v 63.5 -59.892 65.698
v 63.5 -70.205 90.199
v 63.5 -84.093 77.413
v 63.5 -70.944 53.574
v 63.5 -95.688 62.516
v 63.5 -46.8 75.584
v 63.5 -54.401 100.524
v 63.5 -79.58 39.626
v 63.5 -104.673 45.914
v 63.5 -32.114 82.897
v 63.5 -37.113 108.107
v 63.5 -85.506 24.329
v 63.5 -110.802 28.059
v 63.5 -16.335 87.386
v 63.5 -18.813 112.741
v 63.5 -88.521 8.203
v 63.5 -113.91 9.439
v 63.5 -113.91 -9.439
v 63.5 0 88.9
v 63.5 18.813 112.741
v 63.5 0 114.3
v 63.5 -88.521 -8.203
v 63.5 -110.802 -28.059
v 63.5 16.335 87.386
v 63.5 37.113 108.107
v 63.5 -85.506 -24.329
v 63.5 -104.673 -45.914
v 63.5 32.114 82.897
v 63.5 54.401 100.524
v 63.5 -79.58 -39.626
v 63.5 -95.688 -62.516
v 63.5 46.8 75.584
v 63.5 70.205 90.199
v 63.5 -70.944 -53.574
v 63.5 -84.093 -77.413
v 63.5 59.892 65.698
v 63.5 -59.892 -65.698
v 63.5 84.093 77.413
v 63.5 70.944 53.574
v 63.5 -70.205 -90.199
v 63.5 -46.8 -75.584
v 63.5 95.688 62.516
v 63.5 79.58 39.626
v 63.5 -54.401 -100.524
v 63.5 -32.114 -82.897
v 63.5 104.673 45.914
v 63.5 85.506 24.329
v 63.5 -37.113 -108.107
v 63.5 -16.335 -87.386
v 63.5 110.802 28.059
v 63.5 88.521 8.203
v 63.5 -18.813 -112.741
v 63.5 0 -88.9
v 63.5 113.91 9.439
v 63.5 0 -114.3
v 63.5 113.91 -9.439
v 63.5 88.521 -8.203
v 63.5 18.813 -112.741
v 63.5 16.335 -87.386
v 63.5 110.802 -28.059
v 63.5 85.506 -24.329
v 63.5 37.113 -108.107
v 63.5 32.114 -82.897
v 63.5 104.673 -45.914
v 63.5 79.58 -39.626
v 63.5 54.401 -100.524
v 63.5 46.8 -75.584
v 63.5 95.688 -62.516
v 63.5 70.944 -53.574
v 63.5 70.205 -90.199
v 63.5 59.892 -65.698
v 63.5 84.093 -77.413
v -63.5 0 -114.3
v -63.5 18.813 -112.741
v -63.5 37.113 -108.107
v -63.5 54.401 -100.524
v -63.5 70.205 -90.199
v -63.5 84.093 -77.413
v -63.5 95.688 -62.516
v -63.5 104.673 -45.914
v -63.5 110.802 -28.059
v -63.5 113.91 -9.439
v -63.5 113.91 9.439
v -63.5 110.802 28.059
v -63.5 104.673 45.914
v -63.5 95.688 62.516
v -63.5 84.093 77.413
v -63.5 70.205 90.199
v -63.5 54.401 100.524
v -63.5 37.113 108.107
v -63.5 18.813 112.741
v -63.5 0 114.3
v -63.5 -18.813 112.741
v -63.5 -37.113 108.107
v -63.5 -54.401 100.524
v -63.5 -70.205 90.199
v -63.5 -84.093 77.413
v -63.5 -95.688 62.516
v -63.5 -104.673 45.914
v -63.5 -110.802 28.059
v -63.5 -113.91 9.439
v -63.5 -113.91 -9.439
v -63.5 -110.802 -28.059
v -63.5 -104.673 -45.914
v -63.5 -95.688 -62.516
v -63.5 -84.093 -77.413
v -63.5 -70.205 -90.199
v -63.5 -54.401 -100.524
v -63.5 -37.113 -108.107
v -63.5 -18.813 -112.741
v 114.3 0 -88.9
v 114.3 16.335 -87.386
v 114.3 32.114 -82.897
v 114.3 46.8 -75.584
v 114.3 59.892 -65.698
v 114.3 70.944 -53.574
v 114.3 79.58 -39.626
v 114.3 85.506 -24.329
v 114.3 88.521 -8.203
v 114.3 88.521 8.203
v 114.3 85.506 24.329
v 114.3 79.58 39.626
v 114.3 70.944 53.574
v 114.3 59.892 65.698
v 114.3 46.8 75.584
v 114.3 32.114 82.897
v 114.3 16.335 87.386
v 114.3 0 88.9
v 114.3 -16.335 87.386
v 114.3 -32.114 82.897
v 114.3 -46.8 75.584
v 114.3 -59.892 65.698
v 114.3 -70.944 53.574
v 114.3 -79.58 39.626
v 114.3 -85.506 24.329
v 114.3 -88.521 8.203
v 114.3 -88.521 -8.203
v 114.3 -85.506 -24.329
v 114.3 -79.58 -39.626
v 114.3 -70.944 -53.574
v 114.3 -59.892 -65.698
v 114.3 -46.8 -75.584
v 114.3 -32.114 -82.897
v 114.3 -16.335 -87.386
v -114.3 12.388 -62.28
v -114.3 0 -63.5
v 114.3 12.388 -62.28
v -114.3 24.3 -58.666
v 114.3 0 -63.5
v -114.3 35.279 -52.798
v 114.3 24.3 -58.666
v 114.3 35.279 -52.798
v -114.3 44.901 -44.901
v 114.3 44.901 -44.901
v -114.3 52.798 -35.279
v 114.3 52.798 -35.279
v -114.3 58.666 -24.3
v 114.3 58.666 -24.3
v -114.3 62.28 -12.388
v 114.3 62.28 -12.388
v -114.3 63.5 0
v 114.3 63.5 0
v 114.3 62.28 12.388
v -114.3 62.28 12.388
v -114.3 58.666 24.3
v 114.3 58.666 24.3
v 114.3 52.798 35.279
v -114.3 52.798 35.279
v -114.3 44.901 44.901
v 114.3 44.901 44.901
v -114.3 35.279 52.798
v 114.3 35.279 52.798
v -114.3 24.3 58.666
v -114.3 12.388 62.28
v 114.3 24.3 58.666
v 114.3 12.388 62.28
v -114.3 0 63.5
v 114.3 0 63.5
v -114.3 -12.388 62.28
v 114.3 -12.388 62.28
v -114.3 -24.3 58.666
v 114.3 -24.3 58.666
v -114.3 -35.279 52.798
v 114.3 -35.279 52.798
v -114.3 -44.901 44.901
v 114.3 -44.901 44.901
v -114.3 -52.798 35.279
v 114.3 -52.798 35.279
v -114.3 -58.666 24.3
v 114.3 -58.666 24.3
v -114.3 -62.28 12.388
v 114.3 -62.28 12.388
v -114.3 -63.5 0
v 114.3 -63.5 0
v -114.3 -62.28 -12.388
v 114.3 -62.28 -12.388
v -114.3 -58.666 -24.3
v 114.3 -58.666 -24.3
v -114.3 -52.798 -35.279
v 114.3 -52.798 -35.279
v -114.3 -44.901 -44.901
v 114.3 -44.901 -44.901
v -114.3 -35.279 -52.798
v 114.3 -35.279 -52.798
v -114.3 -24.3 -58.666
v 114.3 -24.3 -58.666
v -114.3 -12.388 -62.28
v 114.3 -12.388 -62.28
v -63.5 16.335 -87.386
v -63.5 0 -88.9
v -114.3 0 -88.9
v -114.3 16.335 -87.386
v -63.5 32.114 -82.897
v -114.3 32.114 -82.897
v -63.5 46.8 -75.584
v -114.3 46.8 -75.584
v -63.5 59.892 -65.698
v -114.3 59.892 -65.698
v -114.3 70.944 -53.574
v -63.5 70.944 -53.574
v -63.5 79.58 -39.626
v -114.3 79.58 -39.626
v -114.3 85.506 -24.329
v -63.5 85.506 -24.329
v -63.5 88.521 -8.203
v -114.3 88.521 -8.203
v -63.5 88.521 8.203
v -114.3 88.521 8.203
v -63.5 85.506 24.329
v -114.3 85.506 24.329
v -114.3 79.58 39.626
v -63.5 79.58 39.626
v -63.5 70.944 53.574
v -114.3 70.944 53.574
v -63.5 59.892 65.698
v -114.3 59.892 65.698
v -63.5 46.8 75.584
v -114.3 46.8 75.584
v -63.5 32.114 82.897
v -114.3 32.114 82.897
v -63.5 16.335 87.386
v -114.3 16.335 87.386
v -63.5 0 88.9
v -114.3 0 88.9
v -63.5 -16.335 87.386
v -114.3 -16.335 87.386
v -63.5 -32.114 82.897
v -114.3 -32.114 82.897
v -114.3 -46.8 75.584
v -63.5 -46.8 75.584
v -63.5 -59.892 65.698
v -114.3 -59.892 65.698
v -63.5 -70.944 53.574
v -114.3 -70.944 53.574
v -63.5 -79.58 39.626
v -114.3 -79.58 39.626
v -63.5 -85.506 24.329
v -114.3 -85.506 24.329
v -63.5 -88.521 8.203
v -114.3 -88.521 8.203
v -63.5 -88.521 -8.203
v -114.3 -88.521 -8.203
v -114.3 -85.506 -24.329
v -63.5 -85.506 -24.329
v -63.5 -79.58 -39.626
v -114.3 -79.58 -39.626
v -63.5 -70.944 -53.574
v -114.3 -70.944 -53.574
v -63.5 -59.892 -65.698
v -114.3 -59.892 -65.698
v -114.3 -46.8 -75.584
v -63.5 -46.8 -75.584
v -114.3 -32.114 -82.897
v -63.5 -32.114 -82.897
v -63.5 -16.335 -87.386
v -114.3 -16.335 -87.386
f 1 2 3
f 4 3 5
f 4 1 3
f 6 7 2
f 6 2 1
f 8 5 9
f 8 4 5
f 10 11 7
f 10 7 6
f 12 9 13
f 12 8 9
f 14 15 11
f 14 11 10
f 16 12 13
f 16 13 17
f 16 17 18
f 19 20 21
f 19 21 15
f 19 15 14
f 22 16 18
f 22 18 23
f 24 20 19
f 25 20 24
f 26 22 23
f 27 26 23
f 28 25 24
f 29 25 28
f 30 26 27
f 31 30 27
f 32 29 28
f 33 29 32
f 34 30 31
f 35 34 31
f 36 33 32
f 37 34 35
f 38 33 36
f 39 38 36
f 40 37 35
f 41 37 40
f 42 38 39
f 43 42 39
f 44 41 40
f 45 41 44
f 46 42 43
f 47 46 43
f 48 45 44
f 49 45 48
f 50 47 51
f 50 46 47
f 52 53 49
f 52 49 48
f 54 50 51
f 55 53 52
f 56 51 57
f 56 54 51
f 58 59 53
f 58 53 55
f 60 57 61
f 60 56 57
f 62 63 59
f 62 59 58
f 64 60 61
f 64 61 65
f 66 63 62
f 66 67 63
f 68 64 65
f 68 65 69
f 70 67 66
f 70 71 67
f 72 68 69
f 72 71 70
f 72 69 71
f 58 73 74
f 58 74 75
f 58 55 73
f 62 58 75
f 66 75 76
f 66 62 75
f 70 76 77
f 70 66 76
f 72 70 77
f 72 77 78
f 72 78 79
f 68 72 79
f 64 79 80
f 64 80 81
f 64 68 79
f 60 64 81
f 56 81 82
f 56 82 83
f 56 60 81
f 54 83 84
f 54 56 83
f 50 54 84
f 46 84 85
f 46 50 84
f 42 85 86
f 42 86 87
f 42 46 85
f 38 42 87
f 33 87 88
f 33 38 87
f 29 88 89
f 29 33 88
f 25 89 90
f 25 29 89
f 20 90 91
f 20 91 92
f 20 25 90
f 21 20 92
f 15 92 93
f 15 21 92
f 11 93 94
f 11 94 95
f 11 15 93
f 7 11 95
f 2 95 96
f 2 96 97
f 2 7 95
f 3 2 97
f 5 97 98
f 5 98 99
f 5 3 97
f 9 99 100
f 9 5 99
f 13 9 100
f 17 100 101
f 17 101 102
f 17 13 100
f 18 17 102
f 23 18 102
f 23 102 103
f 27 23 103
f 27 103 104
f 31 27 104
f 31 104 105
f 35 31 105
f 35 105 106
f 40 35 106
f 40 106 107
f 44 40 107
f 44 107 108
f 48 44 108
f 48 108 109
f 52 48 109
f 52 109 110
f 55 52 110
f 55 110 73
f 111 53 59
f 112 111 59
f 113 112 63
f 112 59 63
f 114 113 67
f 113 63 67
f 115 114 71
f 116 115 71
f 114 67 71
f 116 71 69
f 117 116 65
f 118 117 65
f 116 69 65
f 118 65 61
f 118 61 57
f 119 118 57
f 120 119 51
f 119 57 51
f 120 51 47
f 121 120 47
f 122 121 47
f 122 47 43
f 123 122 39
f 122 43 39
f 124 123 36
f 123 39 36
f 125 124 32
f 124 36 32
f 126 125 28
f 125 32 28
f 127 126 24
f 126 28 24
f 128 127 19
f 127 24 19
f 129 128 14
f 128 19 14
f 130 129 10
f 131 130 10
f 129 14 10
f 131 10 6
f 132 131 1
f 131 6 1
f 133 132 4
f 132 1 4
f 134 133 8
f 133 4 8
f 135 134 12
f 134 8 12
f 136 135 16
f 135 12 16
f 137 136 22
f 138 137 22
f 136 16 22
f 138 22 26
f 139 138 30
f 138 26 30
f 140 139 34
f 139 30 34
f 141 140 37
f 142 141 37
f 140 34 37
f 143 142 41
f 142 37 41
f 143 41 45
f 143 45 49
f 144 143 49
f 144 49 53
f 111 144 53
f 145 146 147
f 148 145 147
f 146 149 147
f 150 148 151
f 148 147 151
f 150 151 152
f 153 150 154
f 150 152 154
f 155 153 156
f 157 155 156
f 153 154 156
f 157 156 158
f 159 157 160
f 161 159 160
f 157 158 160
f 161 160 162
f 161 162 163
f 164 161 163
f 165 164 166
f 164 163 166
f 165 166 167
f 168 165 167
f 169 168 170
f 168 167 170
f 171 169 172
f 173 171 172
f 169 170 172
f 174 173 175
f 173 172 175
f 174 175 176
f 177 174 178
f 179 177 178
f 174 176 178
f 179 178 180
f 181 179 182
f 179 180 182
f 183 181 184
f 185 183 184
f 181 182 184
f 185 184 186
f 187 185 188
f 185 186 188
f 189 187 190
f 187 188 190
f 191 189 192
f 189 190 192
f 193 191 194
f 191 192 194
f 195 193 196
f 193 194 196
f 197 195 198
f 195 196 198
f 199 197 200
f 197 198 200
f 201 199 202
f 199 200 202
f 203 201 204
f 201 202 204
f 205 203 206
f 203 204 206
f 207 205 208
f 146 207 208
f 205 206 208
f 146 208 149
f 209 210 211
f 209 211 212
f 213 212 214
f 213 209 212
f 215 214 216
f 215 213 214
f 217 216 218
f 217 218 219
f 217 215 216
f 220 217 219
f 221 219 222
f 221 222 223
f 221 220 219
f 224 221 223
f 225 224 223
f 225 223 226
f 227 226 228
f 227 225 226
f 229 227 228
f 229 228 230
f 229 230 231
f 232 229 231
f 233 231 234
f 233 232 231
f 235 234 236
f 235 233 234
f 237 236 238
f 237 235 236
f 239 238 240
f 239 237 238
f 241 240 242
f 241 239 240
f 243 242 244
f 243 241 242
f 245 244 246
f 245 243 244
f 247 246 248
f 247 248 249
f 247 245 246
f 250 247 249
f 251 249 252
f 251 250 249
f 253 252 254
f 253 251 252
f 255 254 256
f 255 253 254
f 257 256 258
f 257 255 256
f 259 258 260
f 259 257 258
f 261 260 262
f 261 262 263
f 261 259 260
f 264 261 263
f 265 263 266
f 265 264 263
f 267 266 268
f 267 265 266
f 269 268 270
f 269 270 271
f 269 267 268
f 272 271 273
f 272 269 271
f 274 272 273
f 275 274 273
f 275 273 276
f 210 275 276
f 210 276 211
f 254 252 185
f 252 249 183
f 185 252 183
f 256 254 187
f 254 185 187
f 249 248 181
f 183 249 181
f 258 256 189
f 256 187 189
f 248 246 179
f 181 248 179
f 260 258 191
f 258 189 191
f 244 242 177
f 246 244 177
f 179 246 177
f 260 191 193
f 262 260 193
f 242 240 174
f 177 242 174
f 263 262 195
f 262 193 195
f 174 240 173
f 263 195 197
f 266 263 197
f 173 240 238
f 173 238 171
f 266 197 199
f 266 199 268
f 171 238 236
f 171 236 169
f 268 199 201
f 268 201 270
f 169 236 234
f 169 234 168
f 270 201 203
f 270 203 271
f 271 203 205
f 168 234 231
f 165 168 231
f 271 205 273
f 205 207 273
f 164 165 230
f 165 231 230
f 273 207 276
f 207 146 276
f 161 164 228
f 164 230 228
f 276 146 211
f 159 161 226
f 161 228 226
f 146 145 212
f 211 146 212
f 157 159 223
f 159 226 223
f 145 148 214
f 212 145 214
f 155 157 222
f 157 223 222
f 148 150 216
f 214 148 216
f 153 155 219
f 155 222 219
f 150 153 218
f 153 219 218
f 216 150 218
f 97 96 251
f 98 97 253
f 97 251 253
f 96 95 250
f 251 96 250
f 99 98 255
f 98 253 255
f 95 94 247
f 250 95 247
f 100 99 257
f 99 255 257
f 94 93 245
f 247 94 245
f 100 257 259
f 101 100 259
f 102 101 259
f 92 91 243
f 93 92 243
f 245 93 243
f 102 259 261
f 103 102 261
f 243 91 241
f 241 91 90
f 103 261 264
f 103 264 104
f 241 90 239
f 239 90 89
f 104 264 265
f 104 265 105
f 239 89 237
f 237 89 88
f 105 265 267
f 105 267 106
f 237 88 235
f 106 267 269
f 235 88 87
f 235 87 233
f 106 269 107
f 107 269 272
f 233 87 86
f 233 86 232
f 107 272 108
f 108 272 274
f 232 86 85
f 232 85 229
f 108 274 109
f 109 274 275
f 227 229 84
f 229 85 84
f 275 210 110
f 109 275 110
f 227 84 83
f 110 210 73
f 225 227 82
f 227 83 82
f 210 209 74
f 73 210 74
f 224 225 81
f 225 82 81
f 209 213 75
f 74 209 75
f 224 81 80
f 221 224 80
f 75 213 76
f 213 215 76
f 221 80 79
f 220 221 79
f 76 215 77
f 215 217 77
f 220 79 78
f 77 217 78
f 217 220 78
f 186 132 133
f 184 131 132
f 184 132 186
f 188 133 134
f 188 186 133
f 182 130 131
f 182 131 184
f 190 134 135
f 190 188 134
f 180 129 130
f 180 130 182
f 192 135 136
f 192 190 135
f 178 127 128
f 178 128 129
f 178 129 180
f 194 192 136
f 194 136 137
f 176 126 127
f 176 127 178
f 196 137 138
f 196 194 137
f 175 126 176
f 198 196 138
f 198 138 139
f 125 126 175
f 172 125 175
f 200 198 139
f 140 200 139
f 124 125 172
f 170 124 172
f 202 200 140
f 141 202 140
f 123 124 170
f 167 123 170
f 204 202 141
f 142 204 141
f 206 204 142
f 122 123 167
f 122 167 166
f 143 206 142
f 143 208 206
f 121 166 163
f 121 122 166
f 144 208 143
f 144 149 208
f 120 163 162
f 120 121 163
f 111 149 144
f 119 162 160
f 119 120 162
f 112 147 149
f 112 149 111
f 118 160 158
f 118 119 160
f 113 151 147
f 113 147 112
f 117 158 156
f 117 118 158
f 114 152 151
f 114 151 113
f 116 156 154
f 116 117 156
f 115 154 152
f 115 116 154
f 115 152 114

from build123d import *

# Parameters (mm, degrees)
SKETCH1_R           = 114.3
SKETCH1_R_2         = 63.5
BOSS_EXTRUDE1_DEPTH = 63.5
SKETCH2_R           = 88.9
SKETCH2_R_2         = 63.5
BOSS_EXTRUDE2_DEPTH = 50.8


with BuildPart() as part:
    # Sketch1 → Boss-Extrude1 (new, symmetric)
    with BuildSketch(Plane(origin=(0, 0, 0), x_dir=(0, 0, -1), z_dir=(1, 0, 0))):
        Circle(SKETCH1_R)
        Circle(SKETCH1_R_2, mode=Mode.SUBTRACT)
    extrude(amount=BOSS_EXTRUDE1_DEPTH, both=True)

    # Sketch2 → Boss-Extrude2 (add)
    with BuildSketch(Plane(origin=(63.5, 0, 0), x_dir=(0, 0, -1), z_dir=(1, 0, 0))):
        Circle(SKETCH2_R)
        Circle(SKETCH2_R_2, mode=Mode.SUBTRACT)
    boss_extrude2 = extrude(amount=BOSS_EXTRUDE2_DEPTH)

    # Mirror1: Boss-Extrude2 across plane
    add(boss_extrude2.mirror(Plane(origin=(0, 0, 0), x_dir=(0, 0, 1), z_dir=(1, 0, 0))))


solid = part.part
